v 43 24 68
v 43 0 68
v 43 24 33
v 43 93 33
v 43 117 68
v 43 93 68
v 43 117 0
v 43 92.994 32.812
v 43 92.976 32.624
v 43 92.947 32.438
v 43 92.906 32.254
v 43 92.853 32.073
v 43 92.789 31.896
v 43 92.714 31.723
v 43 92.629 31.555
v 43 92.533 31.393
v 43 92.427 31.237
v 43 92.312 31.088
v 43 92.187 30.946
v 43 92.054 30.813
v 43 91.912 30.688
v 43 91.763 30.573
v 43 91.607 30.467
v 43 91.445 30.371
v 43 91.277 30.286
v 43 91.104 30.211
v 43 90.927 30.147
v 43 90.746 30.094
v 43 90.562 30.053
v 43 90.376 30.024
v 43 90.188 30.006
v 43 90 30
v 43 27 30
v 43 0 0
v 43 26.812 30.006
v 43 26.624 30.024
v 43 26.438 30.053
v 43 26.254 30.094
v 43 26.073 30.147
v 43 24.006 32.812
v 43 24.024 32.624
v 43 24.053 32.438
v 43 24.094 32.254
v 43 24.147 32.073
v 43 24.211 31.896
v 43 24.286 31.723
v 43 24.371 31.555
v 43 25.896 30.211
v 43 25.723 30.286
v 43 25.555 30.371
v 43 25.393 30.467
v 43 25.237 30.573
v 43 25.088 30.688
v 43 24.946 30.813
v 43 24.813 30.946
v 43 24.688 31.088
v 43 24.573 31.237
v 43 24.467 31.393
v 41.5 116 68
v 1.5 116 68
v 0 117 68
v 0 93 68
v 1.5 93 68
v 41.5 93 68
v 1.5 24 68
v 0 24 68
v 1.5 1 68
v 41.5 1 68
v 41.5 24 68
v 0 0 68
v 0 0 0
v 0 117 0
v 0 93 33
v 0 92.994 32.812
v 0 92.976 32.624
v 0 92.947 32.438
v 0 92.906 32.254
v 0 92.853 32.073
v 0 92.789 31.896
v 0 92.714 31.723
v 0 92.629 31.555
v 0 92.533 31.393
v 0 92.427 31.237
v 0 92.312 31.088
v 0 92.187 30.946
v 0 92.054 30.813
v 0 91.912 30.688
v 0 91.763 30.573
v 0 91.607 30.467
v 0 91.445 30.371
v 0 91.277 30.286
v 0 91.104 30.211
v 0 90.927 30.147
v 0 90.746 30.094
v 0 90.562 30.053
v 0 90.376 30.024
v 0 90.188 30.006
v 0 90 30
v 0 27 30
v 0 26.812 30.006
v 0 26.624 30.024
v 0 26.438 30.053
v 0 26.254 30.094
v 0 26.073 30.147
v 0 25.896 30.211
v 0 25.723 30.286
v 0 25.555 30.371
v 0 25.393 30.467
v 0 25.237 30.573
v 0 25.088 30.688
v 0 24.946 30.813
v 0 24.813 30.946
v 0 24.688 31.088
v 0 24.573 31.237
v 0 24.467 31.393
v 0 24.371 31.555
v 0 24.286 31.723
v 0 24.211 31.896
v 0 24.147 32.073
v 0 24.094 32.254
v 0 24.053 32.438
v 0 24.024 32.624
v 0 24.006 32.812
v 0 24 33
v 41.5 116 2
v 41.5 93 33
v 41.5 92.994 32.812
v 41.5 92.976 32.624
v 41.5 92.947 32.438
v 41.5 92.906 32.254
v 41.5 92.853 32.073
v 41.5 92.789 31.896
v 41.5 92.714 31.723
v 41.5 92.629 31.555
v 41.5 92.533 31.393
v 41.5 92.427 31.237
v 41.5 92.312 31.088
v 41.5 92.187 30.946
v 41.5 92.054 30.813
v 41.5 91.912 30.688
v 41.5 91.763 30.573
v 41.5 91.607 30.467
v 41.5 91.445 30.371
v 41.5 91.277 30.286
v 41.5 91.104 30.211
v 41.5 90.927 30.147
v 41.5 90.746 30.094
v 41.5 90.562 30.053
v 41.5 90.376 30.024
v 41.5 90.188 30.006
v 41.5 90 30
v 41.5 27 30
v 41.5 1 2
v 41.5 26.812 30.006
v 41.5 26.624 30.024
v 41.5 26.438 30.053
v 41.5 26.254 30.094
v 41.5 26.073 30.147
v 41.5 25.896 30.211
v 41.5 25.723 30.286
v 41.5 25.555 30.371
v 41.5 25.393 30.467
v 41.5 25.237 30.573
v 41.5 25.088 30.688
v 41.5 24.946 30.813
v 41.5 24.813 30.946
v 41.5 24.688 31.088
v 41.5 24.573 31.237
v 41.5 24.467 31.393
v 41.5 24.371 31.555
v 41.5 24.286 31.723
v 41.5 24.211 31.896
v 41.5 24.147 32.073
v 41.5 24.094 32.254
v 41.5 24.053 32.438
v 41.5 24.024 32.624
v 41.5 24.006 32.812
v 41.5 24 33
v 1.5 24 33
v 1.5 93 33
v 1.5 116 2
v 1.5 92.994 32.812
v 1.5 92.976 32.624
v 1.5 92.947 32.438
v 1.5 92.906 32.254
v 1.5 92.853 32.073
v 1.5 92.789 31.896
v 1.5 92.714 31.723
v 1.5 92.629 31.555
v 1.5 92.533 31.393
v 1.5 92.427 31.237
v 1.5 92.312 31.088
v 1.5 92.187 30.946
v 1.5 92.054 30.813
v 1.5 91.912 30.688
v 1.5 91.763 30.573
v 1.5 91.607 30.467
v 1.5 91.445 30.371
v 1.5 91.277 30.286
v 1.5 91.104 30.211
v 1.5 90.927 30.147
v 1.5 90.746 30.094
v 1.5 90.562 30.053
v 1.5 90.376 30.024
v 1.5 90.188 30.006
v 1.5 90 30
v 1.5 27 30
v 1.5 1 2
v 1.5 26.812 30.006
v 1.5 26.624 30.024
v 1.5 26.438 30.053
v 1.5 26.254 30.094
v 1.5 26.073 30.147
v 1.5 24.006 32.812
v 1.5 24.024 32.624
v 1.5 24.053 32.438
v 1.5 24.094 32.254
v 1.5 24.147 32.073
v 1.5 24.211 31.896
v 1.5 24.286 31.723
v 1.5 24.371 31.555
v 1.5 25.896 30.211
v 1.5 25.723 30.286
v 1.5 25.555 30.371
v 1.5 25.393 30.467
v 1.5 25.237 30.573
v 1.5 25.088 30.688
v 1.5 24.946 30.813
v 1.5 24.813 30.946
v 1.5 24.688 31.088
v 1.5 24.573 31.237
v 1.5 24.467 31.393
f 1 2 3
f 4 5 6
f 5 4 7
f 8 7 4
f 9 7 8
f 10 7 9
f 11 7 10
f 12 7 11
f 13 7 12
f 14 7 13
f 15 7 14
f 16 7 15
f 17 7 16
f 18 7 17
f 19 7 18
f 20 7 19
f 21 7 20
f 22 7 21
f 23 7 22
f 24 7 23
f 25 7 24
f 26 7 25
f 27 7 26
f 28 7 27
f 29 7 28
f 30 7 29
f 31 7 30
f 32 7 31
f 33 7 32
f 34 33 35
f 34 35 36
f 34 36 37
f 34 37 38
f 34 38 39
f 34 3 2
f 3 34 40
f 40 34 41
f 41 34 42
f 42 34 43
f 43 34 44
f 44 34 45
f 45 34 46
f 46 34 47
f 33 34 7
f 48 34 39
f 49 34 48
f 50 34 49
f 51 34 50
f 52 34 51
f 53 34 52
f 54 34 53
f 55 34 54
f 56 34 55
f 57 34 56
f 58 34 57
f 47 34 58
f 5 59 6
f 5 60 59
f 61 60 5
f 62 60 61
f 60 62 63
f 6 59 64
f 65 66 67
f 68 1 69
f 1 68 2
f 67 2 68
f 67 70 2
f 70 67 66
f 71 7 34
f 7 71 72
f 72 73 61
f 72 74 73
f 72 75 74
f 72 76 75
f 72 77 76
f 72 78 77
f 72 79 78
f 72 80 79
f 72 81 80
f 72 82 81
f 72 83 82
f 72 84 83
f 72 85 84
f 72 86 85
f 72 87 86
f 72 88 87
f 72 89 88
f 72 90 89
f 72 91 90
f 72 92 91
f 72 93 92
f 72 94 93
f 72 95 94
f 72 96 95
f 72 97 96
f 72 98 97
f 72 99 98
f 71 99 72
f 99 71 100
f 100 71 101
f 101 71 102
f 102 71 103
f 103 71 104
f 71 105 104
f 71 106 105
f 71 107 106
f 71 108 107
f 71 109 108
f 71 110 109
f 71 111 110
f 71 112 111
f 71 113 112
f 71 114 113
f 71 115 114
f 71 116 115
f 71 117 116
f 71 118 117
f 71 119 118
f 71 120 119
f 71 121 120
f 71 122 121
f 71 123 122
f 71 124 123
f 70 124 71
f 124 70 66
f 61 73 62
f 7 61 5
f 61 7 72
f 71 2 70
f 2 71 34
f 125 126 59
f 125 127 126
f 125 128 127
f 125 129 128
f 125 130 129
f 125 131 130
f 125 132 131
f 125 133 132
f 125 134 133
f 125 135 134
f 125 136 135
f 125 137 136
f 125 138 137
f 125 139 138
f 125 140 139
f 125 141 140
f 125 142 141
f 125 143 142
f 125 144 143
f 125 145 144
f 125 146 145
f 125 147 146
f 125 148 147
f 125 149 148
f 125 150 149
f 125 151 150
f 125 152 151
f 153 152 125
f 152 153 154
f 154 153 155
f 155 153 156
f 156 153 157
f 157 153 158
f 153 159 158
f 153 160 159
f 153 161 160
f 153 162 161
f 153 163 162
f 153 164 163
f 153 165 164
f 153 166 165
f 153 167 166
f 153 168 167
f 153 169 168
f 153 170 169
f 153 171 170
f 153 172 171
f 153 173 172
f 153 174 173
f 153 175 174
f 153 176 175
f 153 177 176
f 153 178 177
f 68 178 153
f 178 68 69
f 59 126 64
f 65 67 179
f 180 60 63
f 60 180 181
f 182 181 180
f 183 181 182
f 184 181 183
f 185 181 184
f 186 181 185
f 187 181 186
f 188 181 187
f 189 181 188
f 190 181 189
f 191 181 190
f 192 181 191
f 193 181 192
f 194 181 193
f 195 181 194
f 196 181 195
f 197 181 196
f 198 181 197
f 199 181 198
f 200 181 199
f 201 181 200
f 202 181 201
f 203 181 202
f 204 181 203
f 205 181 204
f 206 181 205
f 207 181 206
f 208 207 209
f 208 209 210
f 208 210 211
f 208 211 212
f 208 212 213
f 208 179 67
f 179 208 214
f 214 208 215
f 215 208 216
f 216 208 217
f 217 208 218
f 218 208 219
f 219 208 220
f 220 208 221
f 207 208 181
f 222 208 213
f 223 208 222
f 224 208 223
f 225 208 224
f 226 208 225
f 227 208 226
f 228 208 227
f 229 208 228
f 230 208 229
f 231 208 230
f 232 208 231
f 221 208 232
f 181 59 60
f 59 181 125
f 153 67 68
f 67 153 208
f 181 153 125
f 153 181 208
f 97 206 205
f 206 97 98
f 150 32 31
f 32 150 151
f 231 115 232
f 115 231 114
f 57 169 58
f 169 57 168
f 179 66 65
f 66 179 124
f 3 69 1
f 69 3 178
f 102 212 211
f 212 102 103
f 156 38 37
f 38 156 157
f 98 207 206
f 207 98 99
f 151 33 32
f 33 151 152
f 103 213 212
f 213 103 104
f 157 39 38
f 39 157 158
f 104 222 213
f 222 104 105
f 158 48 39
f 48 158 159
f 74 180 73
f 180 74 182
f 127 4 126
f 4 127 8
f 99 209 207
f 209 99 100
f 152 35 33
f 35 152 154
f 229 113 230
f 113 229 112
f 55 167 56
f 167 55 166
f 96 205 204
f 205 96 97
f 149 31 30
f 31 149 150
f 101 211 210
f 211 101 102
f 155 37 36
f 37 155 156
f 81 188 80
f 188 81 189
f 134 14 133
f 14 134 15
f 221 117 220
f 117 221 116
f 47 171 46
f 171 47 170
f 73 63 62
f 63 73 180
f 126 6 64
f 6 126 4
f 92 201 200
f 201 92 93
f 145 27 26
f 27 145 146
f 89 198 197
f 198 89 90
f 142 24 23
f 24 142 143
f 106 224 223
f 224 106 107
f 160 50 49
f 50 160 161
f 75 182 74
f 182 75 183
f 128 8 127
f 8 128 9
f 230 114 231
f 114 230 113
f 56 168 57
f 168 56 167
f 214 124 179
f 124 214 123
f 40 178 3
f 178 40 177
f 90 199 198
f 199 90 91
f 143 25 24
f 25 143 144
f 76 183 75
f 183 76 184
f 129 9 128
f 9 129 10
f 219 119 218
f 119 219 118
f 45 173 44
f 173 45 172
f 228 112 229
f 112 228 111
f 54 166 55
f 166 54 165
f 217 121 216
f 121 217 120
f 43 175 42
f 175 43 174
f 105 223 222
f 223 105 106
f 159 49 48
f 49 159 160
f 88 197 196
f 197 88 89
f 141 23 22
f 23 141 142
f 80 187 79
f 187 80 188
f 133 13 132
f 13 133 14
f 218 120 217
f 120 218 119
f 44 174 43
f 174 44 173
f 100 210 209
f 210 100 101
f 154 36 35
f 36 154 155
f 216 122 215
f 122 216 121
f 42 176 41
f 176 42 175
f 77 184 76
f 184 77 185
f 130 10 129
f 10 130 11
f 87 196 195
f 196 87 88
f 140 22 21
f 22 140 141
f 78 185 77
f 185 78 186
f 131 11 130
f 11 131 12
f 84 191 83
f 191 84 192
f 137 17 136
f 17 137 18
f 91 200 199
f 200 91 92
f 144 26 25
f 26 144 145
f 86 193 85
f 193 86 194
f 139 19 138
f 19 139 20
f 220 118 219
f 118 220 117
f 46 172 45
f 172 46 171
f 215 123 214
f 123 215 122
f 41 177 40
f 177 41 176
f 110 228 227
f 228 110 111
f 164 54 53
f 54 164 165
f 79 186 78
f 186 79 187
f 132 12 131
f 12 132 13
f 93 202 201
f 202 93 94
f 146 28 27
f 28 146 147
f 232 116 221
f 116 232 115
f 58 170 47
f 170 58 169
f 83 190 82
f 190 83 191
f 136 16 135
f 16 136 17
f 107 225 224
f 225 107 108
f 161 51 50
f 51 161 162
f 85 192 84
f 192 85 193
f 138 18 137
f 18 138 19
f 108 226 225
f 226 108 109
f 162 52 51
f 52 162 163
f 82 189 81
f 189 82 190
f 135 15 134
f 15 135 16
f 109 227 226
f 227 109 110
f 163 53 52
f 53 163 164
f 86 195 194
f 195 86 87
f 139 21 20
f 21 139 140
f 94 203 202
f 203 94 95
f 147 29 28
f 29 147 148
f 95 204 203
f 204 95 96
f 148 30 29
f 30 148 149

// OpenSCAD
include <lib/boardgame_insert_toolkit_lib.2.scad>;

// determines whether lids are output.
g_b_print_lid = true;

// determines whether boxes are output.
g_b_print_box = true; 

// Focus on one box
g_isolated_print_box = ""; 

// Used to visualize how all of the boxes fit together. 
g_b_visualization = false;          
        
// this is the outer wall thickness. 
//Default = 1.5mm
g_wall_thickness = 1.5;

// The tolerance value is extra space put between planes of the lid and box that fit together.
// Increase the tolerance to loosen the fit and decrease it to tighten it.
//
// Note that the tolerance is applied exclusively to the lid.
// So if the lid is too tight or too loose, change this value ( up for looser fit, down for tighter fit ) and 
// you only need to reprint the lid.
// 
// The exception is the stackable box, where the bottom of the box is the lid of the box below,
// in which case the tolerance also affects that box bottom.
//
g_tolerance = 0.15;

// This adjusts the position of the lid detents downward. 
// The larger the value, the bigger the gap between the lid and the box.
g_tolerance_detents_pos = 0.1;

// This determines whether the default single material version is output, or, if printing in multiple materials, 
// which layer to output.
//
g_print_mmu_layer = "default"; // [ "default" | "mmu_box_layer" | "mmu_label_layer" ]

data =
[
    [   "Ships",
        [
            [ BOX_SIZE_XYZ,[43, 117, 68] ],
            [ BOX_NO_LID_B,
                [
                    [ ],
                ]
            ],
            [ BOX_COMPONENT,
                [
                    [ CMP_SHAPE, SQUARE ],
                    [ CMP_NUM_COMPARTMENTS_XY, [1, 1] ],
                    [ CMP_COMPARTMENT_SIZE_XYZ, [ 40, 115, 66] ],
                    [ CMP_CUTOUT_SIDES_4B, [f,f,t,t]],
                    [ CMP_CUTOUT_HEIGHT_PCT, 50 ],
                    [ CMP_CUTOUT_WIDTH_PCT, 60 ],
                    [ CMP_CUTOUT_TYPE, BOTH ],
                ]
            ],

        ]
    ],
];


MakeAll();
